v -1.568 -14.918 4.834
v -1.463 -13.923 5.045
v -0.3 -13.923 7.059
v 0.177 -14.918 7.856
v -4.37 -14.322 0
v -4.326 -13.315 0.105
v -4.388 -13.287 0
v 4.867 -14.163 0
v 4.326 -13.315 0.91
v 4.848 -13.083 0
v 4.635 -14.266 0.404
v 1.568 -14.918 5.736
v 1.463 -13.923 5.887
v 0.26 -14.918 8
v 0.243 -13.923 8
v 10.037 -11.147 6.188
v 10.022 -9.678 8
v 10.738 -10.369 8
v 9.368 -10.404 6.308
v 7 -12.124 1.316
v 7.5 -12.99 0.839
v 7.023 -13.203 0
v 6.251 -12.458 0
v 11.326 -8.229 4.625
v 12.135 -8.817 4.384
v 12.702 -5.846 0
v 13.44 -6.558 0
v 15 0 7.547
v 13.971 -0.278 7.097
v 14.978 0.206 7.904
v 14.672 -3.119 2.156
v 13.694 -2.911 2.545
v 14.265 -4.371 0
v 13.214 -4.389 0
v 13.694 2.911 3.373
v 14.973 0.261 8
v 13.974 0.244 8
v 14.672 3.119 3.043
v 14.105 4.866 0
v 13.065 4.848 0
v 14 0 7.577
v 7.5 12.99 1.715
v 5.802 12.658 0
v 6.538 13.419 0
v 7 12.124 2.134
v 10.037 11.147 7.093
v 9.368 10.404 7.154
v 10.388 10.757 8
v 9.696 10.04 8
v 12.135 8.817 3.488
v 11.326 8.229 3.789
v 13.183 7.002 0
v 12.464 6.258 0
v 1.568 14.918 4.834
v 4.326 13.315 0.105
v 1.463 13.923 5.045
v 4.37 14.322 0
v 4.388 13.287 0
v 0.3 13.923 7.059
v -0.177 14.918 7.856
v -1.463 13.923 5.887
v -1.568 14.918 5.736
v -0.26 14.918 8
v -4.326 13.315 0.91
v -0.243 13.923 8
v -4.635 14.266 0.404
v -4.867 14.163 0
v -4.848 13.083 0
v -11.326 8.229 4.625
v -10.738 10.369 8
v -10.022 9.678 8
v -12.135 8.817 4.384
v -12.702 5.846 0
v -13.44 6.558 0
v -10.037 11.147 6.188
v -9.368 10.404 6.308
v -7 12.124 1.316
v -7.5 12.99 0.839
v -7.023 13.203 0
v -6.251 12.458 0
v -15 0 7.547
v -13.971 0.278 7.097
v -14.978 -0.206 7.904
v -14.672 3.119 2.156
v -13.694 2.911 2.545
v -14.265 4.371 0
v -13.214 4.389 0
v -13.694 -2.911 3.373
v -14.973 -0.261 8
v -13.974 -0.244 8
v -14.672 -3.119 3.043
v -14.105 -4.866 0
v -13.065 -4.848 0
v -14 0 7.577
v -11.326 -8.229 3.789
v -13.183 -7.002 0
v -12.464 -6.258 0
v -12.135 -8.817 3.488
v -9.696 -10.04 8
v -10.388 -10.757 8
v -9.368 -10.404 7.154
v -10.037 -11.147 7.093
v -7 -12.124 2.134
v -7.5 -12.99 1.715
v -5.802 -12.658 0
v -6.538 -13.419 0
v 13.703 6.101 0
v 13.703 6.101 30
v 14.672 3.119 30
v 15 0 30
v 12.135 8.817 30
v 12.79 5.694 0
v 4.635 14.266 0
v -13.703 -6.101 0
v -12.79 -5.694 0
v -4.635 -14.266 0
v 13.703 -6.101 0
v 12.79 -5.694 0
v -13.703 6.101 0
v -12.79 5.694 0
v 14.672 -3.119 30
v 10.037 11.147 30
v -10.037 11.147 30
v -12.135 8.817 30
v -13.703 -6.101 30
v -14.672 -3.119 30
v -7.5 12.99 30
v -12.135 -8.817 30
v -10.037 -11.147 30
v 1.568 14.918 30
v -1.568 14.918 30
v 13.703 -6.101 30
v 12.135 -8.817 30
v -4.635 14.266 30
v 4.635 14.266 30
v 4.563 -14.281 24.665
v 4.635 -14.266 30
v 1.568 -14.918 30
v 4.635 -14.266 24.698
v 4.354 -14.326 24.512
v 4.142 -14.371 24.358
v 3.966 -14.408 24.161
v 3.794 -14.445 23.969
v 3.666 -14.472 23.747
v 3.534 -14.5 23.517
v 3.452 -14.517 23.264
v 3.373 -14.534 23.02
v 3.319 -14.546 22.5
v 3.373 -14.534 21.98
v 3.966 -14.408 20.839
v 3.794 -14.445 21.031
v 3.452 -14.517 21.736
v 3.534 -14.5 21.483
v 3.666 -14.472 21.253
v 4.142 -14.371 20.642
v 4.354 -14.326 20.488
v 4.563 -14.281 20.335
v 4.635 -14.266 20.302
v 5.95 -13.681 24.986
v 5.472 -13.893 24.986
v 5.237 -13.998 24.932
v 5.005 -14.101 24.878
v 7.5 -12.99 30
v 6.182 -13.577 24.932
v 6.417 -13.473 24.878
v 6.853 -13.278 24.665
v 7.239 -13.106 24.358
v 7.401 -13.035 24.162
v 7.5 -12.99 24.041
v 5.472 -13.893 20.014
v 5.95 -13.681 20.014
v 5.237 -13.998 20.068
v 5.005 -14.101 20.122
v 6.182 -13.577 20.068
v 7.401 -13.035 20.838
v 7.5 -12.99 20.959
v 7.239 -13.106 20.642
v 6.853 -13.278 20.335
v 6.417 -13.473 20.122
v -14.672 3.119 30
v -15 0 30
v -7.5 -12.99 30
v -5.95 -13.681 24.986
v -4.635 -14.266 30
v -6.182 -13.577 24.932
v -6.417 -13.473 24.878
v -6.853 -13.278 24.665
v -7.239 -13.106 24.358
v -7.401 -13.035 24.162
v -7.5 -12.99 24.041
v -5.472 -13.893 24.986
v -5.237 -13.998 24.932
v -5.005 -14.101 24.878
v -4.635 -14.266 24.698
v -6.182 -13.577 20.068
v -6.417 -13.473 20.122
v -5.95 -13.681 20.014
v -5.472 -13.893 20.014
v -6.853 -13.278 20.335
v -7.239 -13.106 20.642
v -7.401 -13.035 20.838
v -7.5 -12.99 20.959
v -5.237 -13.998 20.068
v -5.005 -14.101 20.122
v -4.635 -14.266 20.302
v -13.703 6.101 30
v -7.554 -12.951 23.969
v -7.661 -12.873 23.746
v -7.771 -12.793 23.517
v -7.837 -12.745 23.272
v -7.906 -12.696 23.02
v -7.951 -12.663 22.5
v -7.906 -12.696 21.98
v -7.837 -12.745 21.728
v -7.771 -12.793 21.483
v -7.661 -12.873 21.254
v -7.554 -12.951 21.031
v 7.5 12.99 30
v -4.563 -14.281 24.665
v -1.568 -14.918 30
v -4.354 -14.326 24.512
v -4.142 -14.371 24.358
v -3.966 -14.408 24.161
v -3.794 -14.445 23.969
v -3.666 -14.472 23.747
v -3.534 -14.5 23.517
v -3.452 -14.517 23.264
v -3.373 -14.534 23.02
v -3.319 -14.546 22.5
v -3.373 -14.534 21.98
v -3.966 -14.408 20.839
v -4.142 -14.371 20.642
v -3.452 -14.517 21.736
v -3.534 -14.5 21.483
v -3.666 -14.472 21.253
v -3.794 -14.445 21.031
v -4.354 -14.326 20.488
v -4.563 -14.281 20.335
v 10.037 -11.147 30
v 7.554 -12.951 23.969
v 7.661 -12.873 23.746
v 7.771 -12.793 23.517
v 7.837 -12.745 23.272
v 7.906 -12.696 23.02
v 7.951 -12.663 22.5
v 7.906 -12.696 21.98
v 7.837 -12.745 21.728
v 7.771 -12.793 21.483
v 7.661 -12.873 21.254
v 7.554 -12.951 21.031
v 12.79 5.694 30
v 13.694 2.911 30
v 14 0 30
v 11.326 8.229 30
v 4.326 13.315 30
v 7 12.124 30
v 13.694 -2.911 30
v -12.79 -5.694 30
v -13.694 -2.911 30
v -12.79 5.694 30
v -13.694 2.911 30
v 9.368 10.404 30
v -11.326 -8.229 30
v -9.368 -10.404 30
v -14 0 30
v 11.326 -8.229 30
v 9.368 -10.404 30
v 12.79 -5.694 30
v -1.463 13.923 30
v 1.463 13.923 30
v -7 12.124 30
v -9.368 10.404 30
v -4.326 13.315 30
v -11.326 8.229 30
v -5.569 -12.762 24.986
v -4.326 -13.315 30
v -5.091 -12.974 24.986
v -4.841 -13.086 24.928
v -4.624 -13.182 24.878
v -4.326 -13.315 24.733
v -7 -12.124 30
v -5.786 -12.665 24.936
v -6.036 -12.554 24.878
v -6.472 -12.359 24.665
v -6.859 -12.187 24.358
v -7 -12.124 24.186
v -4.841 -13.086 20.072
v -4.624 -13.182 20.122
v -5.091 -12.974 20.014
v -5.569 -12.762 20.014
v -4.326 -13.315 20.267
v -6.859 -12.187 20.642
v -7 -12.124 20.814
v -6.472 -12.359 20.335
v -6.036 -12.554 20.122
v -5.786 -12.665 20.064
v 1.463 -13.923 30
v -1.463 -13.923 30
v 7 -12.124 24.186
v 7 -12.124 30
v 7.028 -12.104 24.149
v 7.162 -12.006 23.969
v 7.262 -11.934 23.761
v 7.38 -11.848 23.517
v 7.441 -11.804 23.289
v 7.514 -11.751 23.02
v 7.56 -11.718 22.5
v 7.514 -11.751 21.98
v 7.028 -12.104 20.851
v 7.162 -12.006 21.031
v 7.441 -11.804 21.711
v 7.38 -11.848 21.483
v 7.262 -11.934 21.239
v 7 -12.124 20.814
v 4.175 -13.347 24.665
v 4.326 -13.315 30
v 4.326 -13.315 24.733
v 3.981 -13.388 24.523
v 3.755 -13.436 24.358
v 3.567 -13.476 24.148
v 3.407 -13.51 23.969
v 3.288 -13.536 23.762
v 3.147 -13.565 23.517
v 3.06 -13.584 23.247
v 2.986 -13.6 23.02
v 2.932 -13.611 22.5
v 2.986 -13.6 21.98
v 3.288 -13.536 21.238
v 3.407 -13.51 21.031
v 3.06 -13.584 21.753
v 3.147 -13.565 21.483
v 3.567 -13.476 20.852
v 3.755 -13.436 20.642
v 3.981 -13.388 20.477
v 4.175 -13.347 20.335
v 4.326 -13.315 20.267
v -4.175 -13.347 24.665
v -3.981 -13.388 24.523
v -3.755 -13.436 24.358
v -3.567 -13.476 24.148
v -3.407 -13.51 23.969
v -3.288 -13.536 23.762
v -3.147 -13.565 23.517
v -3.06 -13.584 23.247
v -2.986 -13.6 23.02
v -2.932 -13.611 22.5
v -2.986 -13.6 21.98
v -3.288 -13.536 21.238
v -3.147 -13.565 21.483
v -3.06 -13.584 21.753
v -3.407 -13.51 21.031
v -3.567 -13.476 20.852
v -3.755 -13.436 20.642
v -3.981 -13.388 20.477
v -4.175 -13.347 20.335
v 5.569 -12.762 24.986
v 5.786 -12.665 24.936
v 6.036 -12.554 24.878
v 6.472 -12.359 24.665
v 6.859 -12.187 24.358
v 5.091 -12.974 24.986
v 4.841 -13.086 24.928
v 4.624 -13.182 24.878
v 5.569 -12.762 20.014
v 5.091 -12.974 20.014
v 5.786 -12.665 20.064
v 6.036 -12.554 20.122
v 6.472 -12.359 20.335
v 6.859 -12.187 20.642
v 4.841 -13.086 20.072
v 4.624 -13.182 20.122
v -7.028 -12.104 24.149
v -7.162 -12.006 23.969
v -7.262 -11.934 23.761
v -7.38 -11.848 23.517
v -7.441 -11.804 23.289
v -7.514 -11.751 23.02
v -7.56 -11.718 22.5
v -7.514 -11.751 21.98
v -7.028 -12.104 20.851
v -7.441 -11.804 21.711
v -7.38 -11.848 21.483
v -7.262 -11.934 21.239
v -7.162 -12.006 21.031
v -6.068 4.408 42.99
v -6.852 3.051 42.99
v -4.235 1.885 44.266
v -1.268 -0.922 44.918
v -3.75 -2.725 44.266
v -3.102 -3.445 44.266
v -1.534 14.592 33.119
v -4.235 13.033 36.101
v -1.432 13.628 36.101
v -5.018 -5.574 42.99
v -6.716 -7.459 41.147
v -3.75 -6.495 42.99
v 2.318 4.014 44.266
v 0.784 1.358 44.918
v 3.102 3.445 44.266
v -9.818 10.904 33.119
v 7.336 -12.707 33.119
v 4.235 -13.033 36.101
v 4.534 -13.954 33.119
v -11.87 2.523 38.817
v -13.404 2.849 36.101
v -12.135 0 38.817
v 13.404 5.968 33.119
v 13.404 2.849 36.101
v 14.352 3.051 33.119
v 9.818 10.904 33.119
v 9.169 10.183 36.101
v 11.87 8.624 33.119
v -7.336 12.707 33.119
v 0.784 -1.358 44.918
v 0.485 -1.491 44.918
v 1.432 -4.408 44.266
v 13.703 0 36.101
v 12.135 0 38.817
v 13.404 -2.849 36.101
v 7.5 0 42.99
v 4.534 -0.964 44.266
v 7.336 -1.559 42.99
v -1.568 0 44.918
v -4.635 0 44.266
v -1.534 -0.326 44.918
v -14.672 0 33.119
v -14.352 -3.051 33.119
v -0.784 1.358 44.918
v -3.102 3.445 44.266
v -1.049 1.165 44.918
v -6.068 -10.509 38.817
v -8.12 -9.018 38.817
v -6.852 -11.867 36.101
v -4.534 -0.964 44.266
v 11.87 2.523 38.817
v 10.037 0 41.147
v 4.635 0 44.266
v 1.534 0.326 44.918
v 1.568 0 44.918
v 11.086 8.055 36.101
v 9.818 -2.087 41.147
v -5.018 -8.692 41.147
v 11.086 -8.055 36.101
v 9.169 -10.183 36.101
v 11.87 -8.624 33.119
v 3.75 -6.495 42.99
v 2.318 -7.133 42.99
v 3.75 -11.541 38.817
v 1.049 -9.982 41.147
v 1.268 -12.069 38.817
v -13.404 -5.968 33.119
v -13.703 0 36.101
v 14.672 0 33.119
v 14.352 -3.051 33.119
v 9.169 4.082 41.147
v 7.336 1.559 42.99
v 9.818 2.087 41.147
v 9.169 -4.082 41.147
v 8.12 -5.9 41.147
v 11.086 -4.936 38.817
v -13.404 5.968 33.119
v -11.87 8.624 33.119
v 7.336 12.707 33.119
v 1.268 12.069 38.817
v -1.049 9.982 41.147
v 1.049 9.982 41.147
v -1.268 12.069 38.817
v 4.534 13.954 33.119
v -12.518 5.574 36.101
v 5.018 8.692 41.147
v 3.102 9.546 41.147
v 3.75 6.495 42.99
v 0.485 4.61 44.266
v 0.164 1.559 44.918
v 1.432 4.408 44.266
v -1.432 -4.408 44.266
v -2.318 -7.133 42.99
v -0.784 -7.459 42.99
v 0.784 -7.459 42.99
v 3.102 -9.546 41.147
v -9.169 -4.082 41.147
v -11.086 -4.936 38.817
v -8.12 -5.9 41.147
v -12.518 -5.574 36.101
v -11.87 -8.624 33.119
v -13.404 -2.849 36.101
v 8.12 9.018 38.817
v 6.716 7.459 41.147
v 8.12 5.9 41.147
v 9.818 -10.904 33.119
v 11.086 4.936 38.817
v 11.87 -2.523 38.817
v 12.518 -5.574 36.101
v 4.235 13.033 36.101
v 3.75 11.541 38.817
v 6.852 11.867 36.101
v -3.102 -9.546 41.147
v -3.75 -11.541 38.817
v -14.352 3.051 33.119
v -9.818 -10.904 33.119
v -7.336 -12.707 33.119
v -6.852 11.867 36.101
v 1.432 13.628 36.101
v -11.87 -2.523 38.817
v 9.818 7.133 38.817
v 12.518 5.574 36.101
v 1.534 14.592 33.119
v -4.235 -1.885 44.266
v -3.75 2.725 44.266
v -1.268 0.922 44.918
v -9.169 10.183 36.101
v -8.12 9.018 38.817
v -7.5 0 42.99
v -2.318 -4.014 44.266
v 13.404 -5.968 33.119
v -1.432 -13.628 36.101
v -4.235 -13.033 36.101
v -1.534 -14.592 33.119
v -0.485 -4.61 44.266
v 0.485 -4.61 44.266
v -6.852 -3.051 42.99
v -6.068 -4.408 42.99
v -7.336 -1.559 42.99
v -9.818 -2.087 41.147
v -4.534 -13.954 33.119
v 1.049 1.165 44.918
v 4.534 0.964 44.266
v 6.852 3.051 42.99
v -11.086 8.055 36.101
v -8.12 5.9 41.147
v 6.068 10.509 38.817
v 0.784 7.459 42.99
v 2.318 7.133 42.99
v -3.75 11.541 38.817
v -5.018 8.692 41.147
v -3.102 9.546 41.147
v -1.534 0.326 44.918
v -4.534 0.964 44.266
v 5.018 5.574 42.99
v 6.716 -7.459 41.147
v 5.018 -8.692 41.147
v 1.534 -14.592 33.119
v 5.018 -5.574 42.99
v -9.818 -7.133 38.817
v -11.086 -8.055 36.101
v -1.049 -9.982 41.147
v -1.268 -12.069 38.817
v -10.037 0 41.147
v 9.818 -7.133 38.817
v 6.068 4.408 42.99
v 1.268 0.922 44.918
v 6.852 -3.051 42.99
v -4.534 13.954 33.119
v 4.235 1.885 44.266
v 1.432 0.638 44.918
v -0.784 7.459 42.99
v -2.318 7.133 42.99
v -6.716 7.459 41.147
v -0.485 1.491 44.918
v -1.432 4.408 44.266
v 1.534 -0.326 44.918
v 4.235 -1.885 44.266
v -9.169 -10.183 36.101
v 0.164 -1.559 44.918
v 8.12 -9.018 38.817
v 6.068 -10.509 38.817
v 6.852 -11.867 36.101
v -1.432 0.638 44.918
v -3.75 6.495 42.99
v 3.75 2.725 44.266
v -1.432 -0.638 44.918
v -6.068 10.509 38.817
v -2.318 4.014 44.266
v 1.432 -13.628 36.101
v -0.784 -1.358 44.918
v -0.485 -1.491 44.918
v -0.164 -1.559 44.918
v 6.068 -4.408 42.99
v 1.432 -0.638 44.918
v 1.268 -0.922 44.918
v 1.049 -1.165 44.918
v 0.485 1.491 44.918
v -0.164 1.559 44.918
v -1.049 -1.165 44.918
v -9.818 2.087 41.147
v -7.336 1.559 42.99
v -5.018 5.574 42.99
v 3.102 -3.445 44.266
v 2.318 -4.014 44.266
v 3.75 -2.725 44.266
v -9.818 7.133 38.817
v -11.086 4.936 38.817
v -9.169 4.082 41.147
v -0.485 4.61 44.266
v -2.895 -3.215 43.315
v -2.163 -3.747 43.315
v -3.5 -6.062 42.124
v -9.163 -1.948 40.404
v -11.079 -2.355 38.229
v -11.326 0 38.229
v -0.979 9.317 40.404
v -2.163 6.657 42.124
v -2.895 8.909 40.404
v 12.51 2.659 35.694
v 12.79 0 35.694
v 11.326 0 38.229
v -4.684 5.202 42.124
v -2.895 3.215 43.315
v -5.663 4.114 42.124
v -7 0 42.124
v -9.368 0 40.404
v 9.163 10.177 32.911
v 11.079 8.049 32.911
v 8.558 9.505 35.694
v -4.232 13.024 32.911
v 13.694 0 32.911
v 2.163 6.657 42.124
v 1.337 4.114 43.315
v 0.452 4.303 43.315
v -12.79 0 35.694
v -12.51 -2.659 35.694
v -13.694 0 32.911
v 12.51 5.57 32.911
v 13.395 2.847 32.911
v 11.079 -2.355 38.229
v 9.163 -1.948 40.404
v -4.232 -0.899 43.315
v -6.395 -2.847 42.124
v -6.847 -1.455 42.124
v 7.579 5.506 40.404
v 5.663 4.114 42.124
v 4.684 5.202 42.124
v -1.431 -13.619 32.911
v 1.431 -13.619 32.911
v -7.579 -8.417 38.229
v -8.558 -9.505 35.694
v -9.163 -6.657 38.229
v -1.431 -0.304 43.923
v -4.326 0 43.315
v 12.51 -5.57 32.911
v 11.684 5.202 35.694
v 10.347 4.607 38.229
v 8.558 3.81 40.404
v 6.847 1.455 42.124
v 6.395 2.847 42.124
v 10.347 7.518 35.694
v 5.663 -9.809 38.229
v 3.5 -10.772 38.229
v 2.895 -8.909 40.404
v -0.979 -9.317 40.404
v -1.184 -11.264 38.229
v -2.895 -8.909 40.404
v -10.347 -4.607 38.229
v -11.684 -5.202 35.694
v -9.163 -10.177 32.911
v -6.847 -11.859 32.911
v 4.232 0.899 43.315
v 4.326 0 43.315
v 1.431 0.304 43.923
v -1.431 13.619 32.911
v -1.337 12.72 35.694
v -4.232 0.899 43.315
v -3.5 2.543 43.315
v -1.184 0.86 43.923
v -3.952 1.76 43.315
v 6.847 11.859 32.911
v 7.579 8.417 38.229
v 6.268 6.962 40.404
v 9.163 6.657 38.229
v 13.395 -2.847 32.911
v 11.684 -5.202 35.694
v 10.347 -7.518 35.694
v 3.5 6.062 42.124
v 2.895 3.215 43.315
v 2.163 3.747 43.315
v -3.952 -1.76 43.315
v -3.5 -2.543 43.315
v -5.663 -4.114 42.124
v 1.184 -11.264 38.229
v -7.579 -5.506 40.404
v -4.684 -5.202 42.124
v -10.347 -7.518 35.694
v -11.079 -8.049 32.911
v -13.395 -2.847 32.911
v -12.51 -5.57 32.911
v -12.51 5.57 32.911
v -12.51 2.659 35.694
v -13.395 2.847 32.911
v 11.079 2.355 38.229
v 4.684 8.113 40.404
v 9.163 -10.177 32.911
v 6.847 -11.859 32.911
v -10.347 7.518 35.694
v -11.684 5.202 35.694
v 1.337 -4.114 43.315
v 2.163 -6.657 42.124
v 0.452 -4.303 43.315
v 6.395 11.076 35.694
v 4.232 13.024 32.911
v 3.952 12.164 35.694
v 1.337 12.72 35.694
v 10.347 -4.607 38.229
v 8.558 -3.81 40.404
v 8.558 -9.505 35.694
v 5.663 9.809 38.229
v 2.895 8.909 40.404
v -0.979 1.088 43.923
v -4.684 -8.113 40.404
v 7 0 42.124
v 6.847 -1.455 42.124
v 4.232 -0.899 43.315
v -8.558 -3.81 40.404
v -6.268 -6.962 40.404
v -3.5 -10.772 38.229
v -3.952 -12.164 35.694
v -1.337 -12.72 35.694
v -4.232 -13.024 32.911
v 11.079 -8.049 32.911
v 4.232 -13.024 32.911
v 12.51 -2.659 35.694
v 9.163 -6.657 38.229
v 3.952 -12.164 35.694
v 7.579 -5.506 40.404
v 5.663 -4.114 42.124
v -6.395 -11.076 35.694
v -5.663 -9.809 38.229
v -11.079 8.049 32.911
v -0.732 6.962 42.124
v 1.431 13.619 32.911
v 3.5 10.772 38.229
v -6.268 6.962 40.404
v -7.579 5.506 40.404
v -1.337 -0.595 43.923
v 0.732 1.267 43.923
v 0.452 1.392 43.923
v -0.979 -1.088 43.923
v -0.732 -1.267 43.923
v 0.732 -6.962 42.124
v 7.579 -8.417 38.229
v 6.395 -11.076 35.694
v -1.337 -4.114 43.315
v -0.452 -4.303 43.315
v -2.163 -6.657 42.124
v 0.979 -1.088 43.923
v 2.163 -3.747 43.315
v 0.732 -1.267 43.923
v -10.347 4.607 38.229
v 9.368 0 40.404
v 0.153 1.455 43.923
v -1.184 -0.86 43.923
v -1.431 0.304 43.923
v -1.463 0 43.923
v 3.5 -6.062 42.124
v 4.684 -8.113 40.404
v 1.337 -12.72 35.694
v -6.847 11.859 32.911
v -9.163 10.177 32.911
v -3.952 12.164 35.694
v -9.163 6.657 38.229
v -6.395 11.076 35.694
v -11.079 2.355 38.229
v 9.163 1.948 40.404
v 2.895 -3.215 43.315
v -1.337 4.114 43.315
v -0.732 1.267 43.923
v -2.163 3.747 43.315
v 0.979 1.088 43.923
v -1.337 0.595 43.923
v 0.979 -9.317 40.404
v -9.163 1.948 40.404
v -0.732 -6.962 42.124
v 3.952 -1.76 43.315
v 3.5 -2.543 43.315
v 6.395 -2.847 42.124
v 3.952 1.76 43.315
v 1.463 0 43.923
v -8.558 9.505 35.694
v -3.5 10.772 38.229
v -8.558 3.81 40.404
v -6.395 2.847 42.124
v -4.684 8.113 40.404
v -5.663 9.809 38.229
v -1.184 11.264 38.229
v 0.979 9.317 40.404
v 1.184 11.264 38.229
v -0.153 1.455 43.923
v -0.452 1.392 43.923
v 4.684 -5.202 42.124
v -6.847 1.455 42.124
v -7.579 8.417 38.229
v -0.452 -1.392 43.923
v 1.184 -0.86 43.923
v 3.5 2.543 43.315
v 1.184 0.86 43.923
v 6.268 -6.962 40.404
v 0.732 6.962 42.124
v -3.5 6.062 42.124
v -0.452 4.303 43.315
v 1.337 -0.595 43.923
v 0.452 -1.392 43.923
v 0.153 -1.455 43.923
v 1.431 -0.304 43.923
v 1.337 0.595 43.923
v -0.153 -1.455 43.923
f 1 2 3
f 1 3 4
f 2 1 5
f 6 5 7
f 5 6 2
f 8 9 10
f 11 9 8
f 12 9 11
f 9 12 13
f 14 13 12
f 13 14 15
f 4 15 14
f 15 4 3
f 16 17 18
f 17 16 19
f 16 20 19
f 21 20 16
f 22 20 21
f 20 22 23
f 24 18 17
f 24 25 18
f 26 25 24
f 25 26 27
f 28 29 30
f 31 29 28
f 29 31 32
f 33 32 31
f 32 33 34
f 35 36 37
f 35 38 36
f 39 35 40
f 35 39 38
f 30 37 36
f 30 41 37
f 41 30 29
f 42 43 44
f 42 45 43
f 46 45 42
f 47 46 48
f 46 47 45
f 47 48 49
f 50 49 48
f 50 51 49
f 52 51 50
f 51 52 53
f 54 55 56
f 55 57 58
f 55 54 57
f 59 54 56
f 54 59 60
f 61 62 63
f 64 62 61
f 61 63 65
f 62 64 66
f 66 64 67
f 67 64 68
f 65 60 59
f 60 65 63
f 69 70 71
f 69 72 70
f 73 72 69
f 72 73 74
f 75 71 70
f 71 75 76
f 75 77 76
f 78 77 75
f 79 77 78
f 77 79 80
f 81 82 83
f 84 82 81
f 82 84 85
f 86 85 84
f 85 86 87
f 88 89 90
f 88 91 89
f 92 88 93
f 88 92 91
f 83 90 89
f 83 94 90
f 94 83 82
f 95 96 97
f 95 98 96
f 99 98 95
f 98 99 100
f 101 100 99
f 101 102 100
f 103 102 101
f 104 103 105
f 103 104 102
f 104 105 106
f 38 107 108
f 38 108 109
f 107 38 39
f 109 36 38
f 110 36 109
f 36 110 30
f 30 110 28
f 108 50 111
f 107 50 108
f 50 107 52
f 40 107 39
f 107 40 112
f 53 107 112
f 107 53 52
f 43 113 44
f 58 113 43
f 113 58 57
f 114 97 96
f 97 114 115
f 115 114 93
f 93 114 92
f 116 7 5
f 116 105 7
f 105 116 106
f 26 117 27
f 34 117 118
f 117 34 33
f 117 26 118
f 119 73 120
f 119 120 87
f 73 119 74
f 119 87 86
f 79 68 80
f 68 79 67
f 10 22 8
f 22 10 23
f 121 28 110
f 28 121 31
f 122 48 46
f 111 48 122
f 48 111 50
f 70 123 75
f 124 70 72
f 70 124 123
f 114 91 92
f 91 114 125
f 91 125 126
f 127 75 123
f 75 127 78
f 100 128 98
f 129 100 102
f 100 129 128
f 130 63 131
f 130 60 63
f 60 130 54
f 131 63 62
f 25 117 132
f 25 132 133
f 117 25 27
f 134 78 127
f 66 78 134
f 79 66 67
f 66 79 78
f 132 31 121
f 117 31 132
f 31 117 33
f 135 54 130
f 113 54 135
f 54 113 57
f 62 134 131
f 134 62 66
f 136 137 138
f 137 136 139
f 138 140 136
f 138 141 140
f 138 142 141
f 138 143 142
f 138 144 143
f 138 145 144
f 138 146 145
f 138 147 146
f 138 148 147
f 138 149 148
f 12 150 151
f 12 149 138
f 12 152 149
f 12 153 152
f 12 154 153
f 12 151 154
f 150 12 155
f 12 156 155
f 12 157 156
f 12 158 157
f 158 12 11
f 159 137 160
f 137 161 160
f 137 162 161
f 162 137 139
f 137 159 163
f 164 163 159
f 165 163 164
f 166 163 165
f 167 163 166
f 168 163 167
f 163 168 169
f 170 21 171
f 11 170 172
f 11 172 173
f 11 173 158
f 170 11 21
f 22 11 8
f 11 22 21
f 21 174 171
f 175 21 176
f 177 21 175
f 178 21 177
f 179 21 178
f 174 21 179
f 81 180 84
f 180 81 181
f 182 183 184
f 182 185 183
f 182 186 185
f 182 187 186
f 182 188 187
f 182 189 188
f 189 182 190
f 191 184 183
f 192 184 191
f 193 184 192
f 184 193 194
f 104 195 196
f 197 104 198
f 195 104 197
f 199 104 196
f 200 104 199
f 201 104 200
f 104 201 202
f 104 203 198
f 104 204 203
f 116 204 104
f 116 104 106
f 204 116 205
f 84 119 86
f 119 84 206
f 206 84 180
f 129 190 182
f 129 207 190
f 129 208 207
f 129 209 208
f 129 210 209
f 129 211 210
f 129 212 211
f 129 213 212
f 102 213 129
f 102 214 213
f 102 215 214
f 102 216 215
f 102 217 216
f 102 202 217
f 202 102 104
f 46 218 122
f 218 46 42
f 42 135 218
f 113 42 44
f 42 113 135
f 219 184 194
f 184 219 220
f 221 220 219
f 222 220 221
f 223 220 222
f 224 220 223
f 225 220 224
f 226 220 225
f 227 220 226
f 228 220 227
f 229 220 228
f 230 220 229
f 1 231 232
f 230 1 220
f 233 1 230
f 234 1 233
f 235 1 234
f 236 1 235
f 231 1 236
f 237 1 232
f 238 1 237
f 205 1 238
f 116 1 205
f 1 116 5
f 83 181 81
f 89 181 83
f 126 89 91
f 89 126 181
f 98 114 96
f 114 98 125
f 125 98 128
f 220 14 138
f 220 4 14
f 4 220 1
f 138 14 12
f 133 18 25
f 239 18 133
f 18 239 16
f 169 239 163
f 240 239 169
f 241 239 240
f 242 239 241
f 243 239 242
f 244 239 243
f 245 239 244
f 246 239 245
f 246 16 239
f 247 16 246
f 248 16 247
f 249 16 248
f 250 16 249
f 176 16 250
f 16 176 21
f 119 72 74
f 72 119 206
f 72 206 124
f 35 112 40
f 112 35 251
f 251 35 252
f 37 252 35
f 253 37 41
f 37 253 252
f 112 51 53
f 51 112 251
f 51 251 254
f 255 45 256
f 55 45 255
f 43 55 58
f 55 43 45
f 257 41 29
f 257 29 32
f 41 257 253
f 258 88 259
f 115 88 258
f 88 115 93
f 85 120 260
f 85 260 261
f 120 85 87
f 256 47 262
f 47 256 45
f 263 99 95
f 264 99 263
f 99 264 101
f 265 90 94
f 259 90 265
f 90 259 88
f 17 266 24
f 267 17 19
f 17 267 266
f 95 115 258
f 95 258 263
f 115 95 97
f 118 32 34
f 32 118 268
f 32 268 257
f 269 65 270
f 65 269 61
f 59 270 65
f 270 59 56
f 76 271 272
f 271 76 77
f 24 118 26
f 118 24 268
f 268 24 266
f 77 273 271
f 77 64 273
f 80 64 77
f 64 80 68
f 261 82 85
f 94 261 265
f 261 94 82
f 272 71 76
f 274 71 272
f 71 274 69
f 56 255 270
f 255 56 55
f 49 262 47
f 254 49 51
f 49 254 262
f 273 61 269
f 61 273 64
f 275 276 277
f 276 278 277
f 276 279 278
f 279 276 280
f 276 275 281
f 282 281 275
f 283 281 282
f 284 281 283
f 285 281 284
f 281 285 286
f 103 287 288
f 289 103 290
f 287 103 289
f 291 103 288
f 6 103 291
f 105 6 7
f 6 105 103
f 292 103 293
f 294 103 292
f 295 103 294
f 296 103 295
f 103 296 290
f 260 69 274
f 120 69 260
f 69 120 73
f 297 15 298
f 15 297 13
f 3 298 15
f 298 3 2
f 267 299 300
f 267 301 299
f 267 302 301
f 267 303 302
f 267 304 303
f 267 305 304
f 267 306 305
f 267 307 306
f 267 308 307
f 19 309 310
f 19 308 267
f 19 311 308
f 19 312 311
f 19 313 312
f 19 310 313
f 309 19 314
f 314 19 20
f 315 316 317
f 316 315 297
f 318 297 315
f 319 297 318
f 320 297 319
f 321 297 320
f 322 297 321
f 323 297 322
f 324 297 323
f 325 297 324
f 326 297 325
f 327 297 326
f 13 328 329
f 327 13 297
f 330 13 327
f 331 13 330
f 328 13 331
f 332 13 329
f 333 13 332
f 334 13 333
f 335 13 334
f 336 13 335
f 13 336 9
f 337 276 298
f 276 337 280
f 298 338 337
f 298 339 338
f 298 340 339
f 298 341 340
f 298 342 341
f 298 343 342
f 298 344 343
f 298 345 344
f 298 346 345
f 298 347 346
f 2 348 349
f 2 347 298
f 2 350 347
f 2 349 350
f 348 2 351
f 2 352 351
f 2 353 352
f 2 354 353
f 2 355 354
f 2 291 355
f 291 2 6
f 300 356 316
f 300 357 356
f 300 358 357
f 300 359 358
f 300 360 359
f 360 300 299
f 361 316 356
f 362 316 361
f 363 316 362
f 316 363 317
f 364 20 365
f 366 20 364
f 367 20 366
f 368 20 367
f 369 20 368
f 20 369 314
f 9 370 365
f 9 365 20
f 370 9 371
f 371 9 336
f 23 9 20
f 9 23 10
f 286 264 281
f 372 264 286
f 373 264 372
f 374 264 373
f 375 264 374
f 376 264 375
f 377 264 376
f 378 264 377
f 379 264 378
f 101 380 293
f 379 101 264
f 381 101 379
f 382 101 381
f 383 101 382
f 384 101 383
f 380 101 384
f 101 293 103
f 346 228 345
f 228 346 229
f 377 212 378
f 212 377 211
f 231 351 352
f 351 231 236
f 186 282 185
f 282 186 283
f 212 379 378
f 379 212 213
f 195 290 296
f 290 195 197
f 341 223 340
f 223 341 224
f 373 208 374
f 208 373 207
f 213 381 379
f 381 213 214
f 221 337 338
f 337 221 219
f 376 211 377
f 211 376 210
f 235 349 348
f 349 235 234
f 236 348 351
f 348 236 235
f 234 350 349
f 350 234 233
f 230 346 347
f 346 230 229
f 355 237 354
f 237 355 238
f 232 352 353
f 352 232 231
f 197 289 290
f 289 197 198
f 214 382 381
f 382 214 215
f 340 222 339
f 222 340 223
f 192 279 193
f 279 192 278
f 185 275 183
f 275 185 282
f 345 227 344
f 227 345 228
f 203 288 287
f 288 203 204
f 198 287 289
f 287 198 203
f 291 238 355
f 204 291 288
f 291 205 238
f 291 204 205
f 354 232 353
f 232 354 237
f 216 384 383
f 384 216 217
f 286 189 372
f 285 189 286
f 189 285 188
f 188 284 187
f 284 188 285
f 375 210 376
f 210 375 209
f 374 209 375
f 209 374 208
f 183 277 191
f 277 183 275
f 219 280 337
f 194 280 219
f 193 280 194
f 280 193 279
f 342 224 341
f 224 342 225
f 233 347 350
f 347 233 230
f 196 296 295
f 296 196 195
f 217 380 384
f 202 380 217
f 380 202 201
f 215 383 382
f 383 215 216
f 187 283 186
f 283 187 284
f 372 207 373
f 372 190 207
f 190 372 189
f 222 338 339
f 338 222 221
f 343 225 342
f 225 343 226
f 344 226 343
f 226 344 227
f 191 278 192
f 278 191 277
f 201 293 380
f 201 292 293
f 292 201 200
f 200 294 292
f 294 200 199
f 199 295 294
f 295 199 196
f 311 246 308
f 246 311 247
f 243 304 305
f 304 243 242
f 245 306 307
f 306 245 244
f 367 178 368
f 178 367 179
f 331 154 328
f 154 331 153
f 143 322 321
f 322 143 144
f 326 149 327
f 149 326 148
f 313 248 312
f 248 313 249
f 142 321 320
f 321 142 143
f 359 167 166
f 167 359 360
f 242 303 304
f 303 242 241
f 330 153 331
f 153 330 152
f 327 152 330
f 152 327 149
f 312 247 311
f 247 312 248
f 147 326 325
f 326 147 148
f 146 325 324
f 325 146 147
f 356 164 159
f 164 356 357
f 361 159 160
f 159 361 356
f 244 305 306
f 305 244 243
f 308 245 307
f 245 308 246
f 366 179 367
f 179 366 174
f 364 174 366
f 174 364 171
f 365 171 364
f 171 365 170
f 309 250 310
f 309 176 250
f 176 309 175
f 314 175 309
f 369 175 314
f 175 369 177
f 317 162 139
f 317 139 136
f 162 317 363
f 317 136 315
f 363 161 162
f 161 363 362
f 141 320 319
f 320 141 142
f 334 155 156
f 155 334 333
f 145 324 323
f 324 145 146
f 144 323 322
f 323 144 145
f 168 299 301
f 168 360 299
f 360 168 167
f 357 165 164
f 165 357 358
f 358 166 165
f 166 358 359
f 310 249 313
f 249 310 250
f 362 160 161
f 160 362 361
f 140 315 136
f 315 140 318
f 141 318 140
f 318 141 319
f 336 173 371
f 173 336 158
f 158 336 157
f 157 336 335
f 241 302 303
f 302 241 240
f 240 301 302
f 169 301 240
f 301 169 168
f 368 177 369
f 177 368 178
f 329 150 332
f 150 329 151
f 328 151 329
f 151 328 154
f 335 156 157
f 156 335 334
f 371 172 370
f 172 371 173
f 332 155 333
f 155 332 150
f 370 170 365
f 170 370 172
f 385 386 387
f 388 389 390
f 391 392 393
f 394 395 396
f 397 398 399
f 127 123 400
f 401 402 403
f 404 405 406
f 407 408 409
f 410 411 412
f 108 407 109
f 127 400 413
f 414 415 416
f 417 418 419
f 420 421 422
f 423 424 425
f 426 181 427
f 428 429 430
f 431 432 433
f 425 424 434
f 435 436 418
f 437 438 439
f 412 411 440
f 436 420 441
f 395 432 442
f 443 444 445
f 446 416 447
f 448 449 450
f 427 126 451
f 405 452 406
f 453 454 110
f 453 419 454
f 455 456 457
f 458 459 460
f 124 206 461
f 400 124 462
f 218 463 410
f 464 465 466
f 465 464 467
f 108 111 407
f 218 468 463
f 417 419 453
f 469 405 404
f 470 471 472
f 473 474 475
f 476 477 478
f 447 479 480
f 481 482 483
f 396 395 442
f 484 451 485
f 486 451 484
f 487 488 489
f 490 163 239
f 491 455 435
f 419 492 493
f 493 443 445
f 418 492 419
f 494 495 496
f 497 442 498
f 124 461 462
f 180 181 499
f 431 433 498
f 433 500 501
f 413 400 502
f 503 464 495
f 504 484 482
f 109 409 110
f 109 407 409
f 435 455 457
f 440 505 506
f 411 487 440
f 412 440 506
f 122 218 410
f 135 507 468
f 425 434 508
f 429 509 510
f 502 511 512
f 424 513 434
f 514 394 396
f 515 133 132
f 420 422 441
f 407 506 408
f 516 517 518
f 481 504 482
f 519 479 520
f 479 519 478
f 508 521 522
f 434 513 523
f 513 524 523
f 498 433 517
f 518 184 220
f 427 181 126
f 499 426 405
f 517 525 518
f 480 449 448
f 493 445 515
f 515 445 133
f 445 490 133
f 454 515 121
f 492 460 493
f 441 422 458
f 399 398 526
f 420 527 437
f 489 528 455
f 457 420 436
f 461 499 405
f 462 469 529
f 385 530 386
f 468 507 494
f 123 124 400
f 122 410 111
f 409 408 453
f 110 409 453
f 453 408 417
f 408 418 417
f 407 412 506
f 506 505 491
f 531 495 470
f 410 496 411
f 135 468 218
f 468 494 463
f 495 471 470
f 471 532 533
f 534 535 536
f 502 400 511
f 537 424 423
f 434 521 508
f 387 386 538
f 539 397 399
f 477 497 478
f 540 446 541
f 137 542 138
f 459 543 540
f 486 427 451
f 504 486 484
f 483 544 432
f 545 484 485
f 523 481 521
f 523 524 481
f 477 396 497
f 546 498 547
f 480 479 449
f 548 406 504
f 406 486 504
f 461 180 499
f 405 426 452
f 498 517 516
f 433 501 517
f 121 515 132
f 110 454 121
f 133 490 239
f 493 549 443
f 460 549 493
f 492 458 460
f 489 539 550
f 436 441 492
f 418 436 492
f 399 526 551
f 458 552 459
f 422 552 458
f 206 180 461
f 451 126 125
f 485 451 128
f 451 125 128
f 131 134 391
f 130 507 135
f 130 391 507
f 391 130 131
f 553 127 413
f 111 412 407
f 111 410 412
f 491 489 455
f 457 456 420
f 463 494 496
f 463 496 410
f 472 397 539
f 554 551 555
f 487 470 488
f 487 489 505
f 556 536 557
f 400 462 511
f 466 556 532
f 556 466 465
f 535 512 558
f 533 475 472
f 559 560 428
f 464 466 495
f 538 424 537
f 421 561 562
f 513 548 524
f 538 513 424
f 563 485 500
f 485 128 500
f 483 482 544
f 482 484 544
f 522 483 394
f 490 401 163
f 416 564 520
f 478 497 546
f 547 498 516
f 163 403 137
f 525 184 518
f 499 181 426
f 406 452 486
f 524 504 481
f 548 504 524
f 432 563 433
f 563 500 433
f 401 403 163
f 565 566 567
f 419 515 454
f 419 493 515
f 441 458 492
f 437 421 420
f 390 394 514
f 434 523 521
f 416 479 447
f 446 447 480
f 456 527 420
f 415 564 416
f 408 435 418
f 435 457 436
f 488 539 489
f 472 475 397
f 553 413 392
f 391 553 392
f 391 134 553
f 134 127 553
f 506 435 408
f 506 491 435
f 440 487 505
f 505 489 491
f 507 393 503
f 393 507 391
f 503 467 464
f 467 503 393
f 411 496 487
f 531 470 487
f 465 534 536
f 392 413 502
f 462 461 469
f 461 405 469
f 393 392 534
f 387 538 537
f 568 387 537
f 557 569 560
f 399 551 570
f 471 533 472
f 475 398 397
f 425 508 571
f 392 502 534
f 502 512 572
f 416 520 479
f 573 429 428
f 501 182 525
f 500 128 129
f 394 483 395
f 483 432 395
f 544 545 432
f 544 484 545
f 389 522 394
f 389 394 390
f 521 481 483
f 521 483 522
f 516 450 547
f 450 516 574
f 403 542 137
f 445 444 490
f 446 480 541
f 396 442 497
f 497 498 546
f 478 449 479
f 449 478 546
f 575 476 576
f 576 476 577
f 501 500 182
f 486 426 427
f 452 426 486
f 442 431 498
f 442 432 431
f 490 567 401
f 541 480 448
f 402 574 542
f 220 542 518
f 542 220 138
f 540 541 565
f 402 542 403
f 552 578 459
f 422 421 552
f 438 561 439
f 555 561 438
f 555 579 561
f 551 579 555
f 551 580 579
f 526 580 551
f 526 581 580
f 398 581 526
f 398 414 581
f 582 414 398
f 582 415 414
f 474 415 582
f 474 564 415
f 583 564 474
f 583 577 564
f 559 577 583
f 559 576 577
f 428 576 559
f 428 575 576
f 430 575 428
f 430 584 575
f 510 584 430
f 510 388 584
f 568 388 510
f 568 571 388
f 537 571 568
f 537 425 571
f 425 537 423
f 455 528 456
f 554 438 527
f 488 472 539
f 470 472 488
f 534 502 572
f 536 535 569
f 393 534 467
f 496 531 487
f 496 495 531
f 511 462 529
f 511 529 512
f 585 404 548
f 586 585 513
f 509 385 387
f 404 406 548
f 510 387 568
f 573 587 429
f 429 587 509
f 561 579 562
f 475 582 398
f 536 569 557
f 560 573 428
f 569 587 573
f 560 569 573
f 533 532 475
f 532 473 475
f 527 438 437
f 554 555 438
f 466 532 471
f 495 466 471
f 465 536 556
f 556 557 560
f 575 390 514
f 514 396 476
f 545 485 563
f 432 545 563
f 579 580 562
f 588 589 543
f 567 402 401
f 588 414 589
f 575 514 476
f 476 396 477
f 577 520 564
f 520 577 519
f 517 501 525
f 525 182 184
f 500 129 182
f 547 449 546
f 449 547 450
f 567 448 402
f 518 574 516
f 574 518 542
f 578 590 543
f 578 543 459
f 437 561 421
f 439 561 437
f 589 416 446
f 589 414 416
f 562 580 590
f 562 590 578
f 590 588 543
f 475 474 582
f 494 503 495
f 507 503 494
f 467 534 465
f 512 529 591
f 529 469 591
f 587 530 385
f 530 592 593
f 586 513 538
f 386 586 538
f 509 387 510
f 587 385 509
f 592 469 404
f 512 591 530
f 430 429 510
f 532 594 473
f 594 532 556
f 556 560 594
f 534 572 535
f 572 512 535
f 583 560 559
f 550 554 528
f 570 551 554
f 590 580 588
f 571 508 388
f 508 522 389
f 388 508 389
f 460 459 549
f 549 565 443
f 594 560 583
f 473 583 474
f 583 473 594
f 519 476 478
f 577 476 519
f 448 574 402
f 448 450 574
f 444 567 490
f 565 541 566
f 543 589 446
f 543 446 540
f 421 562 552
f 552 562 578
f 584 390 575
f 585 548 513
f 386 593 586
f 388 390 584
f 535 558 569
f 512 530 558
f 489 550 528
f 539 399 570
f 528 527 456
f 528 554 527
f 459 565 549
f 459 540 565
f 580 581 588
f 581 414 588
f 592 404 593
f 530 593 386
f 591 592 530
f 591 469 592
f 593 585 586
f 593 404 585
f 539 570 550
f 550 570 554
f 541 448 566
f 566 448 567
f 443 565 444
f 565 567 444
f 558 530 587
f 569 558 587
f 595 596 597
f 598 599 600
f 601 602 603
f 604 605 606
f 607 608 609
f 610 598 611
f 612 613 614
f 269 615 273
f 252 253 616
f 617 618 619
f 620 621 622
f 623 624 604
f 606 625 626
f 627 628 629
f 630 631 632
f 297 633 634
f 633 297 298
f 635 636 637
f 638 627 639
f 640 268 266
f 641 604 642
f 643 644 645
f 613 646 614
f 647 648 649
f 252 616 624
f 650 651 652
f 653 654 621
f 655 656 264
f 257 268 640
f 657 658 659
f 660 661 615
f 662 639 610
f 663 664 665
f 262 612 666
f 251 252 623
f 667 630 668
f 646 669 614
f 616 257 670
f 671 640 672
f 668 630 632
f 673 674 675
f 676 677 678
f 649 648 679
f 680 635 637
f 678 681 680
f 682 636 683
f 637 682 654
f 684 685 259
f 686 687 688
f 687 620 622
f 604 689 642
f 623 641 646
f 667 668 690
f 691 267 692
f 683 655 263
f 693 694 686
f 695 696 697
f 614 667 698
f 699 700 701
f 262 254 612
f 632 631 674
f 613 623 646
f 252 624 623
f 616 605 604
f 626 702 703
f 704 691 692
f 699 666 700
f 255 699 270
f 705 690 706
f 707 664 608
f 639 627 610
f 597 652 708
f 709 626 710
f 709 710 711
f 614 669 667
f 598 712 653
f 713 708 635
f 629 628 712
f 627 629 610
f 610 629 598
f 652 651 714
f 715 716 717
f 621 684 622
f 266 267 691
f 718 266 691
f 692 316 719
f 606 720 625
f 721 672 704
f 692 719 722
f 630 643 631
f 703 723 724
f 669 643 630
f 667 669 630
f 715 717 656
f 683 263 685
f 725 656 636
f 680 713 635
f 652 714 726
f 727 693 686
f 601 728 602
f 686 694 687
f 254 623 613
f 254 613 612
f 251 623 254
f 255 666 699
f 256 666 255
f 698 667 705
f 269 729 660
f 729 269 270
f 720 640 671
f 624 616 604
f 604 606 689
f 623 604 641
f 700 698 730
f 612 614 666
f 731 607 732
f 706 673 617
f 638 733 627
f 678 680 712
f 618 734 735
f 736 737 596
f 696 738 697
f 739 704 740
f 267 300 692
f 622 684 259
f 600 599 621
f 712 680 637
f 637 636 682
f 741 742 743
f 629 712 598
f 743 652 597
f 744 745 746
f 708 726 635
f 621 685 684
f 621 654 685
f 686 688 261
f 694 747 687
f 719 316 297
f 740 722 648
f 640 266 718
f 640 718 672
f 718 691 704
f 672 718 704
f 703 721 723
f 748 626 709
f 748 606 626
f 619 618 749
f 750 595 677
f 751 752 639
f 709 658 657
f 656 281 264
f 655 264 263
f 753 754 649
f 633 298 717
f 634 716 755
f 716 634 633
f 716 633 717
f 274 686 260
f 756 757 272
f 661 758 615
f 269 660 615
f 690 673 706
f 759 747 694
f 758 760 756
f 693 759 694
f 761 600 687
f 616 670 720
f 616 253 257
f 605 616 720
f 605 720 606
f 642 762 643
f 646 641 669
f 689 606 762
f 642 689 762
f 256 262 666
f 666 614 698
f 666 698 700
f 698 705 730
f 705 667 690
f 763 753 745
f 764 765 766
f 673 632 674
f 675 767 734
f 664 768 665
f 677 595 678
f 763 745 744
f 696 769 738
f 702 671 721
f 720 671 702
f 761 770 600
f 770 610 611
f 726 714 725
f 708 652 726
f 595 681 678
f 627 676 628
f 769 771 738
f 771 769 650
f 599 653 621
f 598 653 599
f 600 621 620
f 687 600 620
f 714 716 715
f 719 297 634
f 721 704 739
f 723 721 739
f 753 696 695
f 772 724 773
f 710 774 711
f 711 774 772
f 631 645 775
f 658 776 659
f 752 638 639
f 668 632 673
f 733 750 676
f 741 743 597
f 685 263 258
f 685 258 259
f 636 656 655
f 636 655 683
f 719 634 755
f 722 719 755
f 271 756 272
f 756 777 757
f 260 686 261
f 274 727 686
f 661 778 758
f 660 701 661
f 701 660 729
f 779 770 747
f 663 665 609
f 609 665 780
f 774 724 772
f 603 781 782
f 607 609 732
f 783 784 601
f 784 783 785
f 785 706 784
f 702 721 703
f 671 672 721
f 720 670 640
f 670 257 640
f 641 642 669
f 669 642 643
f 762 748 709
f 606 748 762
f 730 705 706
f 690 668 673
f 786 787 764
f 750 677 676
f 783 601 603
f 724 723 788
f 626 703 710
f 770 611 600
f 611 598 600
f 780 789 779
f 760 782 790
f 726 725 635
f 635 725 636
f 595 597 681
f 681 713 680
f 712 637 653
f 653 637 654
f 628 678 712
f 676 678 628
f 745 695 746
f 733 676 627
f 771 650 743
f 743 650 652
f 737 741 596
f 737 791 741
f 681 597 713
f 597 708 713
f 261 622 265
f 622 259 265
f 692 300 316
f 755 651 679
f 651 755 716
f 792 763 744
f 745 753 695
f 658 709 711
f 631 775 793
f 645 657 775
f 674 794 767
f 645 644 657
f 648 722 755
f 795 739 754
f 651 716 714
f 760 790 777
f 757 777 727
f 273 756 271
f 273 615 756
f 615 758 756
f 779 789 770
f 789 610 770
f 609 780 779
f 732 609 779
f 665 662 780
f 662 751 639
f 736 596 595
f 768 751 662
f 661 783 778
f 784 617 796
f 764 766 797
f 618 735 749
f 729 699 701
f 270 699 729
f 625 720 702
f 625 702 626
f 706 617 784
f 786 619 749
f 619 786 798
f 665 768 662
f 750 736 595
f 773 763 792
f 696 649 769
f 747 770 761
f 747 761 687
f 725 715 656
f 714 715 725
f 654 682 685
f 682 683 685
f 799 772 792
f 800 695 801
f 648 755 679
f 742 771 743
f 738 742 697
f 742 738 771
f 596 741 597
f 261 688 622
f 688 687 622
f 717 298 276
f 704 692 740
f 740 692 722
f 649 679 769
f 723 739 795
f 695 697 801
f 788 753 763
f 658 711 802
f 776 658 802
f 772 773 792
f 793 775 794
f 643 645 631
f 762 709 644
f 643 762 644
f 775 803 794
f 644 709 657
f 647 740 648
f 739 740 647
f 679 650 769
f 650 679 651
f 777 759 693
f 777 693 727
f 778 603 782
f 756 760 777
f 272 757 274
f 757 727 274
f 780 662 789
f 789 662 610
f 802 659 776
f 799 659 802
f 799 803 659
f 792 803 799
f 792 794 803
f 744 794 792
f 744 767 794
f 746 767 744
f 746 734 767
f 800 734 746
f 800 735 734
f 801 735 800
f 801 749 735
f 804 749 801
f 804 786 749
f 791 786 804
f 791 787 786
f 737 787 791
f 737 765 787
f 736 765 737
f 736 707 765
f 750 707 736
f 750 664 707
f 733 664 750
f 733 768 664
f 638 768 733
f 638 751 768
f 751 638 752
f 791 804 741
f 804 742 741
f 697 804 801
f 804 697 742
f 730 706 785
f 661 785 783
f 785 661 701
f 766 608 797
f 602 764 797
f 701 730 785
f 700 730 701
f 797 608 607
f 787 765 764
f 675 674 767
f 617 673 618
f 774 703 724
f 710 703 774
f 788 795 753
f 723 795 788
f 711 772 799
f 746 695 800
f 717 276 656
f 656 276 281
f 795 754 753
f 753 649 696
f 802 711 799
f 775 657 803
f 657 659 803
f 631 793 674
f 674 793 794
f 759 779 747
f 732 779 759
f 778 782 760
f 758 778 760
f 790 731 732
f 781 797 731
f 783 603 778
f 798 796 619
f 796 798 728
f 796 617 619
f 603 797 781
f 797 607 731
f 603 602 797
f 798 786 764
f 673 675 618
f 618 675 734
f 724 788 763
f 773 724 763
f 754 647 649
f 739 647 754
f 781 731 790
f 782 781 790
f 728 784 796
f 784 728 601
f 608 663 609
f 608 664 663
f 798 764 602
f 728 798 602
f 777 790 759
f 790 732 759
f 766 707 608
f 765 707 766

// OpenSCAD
$fn = 30 ;

outer_diameter = 30 ;
inner_diameter = 28 ;

height_body = 30 ;

eye_diameter = 5 ;
eye_angle = 45 ;
eye_height = height_body * 3 / 4 ;

skirt_size = 8 ;
skirt_number = 8 ;

head_hole = false ;
head_hole_diameter = 5.2 ;

// body

difference() {
	cylinder (h = height_body, r = outer_diameter/2) ;
	translate ([0,0,-0.1]) cylinder (h = height_body+0.2, r = inner_diameter/2) ;

// eyes
	translate ([0,0,eye_height]) rotate ([90,0,-eye_angle/2]) cylinder (h=outer_diameter, r = eye_diameter/2) ;
	translate ([0,0,eye_height]) rotate ([90,0,eye_angle/2]) cylinder (h=outer_diameter, r = eye_diameter/2) ;

// skirt
	for (i= [1:360/skirt_number:360]) {
		rotate([90,270,i]) cylinder ($fn = 3, r = skirt_size, h = outer_diameter/2+0.1) ;
	} // for

} 


// head

difference () {
	translate ([0,0,height_body]) sphere(r = outer_diameter/2) ;
	translate ([0,0,height_body]) sphere(r = inner_diameter/2) ;
	cylinder (h = height_body, r = outer_diameter/2) ;

	// head hole
	if (head_hole){
		translate([0,0,height_body+(inner_diameter/2)-0.2]) cylinder (r = head_hole_diameter/2, h = outer_diameter-inner_diameter+0.3) ;
	}
}
